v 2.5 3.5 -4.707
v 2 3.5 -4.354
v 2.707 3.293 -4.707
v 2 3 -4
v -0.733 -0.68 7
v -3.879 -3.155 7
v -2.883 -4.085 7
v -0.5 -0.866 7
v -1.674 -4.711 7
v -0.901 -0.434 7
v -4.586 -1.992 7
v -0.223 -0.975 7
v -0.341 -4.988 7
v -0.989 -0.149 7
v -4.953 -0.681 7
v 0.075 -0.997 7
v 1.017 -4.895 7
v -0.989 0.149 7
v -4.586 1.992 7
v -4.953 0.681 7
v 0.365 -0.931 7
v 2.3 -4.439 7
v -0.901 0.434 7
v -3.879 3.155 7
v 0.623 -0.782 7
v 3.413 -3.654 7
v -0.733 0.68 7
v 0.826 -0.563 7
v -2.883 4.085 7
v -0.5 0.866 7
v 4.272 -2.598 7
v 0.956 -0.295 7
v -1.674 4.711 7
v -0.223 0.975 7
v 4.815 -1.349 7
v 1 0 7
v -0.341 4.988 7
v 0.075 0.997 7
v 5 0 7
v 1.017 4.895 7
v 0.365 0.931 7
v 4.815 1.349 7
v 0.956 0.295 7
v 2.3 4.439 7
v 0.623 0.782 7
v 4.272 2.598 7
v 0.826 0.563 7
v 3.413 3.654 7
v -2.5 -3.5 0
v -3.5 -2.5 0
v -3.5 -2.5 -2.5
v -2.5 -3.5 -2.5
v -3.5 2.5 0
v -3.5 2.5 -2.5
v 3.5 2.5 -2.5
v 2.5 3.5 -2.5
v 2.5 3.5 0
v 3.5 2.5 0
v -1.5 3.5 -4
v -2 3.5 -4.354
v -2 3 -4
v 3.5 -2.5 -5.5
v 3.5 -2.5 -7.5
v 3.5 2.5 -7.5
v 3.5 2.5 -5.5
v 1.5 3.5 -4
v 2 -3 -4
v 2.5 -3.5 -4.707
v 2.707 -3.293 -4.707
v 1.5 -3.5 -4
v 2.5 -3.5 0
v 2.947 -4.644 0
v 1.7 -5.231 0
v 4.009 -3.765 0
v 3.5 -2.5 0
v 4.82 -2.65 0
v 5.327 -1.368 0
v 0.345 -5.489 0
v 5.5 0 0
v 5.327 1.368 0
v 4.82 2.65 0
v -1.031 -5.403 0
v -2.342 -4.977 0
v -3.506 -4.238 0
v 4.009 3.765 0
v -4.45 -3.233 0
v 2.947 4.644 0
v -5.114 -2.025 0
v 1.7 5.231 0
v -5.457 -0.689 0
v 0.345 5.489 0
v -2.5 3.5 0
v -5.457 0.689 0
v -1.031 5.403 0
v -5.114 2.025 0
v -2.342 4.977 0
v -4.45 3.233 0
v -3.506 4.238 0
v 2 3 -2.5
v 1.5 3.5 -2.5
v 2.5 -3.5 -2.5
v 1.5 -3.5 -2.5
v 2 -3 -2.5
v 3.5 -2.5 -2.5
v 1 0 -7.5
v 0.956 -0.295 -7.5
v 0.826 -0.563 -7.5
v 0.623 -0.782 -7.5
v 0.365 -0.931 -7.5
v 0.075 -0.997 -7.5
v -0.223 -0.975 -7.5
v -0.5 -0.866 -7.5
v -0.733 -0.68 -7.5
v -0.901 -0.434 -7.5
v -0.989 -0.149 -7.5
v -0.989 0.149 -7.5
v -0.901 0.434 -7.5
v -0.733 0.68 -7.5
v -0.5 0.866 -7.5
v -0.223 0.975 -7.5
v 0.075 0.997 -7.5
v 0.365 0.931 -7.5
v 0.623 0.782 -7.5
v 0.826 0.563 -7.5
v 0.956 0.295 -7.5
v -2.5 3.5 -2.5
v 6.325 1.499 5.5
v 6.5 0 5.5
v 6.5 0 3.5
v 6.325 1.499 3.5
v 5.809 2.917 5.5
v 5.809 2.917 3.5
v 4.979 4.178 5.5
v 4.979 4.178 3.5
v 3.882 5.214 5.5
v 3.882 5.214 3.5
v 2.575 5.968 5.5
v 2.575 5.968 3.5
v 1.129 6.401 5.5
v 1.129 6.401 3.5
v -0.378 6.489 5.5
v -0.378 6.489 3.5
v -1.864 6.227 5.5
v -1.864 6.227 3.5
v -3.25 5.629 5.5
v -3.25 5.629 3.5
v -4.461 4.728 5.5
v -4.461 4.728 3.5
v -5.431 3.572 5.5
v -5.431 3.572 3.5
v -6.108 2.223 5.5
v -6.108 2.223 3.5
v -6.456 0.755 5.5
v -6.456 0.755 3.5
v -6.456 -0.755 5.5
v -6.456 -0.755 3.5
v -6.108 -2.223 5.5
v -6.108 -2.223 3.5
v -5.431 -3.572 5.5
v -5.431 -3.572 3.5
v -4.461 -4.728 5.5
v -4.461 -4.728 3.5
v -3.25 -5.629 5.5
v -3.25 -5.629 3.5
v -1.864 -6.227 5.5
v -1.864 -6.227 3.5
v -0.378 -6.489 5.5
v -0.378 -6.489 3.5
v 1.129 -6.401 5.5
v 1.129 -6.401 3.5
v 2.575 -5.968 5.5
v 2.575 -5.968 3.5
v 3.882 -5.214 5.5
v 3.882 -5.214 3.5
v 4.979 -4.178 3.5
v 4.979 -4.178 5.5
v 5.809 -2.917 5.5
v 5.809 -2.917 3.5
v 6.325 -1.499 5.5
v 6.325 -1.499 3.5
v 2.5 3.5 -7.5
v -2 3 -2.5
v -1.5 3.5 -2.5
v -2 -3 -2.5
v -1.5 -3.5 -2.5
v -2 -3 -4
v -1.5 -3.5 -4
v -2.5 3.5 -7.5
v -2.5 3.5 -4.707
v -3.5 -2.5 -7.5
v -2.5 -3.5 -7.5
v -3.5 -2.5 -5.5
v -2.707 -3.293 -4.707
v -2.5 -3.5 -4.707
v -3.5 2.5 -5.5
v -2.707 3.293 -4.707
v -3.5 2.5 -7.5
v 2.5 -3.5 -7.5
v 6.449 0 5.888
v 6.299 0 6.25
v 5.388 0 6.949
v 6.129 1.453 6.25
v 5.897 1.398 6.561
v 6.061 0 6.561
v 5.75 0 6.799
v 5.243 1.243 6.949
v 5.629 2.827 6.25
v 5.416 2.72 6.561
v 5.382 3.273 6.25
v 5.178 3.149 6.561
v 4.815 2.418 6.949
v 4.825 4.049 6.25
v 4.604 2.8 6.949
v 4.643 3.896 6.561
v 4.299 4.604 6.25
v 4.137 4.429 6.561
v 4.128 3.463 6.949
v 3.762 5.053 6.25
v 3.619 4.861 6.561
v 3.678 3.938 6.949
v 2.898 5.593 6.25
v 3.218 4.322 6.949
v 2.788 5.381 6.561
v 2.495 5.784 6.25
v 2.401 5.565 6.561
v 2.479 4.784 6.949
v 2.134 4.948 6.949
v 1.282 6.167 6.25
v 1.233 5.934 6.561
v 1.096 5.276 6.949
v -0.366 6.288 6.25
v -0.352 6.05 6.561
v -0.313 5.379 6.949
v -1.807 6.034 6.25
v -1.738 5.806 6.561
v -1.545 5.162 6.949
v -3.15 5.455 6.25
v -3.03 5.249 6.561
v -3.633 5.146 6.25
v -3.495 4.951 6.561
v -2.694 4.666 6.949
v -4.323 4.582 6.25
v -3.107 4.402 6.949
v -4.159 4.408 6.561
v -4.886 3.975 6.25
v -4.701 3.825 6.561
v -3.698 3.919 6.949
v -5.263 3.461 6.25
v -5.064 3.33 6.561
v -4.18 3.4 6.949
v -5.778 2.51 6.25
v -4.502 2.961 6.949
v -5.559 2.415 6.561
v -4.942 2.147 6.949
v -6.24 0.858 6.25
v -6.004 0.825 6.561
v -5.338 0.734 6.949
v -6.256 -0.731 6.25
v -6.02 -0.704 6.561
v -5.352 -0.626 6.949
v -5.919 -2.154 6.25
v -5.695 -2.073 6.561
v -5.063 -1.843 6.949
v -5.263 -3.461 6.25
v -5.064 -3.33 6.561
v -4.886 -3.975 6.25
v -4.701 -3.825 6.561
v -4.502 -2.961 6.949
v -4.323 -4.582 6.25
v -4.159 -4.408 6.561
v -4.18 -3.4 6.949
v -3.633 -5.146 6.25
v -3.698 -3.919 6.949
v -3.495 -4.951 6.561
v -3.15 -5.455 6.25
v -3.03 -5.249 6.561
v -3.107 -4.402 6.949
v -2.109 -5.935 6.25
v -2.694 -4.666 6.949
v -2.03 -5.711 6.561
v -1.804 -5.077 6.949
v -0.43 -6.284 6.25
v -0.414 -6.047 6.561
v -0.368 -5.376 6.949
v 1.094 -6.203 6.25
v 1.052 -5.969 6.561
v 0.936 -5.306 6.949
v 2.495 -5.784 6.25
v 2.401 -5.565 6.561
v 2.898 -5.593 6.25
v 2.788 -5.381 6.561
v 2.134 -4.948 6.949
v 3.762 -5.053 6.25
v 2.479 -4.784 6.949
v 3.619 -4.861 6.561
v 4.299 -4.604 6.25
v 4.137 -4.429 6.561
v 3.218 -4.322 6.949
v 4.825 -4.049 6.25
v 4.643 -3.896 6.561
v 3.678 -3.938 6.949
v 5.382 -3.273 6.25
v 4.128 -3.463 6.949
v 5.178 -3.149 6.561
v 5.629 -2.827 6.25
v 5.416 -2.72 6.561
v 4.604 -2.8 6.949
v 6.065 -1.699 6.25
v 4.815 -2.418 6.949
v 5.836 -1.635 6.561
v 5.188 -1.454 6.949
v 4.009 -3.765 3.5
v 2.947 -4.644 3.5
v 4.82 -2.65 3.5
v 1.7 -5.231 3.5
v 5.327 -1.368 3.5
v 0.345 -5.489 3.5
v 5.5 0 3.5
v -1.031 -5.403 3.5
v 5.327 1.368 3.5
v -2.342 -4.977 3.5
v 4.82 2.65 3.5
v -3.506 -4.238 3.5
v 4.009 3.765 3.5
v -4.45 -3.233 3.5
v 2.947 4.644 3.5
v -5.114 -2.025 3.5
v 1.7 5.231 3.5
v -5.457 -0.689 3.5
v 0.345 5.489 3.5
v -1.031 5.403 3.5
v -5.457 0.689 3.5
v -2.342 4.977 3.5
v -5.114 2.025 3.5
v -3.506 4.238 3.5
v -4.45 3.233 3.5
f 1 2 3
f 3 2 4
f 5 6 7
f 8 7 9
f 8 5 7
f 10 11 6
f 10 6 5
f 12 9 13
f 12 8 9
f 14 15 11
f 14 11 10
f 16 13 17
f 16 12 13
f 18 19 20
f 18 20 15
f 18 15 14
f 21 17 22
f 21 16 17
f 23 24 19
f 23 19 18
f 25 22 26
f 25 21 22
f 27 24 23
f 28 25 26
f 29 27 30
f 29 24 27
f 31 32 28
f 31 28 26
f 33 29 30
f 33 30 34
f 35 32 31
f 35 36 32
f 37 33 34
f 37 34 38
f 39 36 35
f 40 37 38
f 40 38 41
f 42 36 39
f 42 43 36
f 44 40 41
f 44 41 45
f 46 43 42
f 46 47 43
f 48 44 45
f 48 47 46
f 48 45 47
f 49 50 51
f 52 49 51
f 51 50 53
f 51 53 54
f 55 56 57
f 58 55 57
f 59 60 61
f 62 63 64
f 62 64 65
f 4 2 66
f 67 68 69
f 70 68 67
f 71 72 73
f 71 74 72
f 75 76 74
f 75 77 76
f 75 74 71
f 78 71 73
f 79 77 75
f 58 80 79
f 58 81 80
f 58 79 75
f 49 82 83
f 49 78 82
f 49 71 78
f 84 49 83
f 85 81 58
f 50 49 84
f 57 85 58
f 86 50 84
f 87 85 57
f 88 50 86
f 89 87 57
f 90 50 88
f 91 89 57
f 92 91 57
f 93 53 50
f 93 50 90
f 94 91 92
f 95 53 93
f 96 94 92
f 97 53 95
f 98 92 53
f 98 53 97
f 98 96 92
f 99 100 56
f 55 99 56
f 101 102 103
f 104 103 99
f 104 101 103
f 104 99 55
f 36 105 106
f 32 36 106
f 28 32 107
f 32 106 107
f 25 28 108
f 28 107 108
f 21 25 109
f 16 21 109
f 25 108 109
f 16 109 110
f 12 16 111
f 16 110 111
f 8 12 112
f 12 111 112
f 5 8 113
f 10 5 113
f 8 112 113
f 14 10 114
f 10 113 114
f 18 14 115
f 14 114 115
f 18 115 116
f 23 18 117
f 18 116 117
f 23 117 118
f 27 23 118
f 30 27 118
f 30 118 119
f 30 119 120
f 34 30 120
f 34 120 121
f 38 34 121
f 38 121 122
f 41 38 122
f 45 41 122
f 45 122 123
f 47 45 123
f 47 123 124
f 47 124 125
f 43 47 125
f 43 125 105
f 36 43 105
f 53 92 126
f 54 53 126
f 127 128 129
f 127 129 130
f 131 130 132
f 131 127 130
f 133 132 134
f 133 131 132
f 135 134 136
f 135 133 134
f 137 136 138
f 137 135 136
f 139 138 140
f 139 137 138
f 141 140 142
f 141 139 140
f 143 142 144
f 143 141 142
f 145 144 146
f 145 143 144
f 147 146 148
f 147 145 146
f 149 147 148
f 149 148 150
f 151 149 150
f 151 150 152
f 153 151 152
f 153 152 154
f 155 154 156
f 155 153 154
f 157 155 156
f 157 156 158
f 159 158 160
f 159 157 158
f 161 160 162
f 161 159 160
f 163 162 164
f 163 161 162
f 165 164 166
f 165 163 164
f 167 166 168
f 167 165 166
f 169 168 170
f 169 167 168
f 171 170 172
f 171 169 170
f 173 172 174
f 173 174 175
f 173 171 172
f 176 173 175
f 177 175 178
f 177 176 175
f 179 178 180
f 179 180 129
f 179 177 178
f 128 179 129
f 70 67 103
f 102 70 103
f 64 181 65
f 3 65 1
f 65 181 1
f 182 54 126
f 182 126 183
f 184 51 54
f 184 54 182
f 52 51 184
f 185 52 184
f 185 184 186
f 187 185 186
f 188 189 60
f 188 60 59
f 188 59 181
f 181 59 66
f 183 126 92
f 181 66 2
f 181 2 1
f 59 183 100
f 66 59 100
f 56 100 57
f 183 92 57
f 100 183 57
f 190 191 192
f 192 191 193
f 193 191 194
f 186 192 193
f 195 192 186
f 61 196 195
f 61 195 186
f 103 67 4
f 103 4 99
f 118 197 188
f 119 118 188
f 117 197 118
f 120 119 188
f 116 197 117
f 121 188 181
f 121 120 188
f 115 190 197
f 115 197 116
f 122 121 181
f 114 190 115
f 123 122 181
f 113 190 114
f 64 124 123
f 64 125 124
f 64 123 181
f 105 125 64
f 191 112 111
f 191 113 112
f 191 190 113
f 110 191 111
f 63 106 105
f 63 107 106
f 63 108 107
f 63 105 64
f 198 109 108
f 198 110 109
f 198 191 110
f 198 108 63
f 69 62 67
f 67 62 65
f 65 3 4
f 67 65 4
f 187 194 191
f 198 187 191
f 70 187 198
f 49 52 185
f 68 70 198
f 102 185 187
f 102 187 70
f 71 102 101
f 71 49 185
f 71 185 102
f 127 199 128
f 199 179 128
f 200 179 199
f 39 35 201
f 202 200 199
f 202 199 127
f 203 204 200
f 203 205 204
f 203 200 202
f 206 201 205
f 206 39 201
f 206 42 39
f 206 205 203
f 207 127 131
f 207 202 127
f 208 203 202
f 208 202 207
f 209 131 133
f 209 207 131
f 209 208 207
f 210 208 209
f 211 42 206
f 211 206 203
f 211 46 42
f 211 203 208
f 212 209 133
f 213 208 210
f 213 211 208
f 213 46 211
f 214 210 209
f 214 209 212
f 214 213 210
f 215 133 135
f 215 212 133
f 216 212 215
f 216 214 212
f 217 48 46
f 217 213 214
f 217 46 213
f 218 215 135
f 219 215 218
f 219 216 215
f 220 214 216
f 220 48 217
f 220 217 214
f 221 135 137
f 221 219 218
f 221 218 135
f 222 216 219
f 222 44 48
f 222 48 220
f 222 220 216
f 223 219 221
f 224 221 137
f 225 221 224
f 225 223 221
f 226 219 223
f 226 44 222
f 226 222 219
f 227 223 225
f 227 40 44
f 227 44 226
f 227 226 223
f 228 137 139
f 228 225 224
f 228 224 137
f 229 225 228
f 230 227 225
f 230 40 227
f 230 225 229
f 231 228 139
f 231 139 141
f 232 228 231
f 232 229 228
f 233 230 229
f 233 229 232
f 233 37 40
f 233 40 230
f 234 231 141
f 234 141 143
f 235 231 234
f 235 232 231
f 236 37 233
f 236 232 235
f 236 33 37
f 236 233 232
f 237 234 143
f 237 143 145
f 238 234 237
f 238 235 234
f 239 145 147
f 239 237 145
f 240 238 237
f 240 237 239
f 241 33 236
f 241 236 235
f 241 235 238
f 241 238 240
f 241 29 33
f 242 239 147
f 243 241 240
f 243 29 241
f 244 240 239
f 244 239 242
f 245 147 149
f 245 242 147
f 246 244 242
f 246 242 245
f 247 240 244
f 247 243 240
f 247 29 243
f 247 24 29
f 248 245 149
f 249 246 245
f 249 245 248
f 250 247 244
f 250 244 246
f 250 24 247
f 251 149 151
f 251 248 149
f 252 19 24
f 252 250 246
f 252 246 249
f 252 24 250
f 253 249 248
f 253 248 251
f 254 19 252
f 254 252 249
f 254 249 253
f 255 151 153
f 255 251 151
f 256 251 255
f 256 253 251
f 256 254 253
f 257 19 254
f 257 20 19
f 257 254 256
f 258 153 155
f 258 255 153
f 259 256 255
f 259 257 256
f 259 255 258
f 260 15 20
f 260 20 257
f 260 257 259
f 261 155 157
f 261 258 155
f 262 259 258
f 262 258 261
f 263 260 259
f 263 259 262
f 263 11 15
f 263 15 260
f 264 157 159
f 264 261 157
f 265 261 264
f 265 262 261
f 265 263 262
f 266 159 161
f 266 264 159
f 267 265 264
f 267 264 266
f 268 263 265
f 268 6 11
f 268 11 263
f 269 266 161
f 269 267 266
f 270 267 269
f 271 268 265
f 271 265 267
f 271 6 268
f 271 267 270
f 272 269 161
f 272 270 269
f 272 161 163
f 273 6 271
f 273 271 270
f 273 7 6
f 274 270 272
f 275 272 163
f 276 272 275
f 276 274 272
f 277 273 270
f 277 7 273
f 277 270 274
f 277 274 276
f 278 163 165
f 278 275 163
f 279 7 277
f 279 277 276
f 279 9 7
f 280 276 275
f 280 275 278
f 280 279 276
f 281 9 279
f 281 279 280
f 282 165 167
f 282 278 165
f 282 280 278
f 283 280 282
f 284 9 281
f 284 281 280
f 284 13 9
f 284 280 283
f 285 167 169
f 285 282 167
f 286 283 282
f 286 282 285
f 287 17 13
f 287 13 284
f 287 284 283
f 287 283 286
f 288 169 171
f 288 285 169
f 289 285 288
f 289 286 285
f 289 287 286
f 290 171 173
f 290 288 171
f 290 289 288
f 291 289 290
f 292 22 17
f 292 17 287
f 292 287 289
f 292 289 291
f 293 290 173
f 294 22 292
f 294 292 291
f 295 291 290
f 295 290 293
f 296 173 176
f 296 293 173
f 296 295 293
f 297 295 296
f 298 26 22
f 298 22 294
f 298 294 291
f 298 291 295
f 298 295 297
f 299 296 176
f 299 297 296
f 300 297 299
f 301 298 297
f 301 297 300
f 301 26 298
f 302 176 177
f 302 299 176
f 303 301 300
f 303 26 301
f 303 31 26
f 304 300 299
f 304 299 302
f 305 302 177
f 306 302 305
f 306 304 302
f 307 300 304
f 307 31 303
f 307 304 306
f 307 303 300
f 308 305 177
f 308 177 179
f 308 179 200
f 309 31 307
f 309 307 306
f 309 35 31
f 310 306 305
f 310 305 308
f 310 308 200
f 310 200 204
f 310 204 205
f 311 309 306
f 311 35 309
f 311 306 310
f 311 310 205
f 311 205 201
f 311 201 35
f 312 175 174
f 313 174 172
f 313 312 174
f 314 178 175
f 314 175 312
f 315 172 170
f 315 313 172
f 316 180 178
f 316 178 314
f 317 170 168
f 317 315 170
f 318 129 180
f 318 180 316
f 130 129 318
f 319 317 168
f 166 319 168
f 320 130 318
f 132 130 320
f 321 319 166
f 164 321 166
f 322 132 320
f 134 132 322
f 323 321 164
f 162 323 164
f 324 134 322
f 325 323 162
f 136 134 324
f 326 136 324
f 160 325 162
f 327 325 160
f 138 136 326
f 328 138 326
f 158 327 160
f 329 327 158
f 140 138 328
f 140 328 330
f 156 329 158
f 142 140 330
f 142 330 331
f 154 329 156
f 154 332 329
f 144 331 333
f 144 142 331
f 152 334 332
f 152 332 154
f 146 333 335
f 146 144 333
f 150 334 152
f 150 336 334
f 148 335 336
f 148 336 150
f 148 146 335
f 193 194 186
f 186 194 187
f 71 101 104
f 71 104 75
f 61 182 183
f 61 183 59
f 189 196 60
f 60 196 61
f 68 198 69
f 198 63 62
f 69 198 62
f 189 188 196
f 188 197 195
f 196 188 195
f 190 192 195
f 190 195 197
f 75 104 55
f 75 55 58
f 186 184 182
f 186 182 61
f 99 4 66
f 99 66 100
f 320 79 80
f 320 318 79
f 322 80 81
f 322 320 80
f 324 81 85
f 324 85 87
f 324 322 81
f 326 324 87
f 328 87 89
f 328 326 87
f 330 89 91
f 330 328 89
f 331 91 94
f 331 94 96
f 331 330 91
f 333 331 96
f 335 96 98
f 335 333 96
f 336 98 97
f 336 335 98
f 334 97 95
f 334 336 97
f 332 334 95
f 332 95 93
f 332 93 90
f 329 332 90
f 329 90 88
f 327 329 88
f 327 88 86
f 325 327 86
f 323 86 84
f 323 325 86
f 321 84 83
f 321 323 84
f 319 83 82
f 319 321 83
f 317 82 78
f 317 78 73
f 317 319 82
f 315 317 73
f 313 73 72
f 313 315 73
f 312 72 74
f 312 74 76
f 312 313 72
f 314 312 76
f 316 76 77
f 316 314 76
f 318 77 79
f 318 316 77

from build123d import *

# Parameters (mm, degrees)
F3_DEPTH     = 3.5
F4_SIZE      = 1
F5_SIZE      = 0.5
F6_T4_DEPTH  = 8.4221557451
F6_T11_DEPTH = 13.7150489639
F6_T21_DEPTH = 8.4221557451
F6_T28_DEPTH = 8.4221557451
F6_T35_DEPTH = 13.7150489639
F6_T45_DEPTH = 8.4221557451
F7_R         = 1.5
F8_R         = 1
F9_DEPTH     = 25


# Not quite as in the source:
# - a fillet or chamfer that OpenCascade refuses, or shapes differently, is made with other operations: its cross-section is extruded or revolved along the edge and cut away or added


with BuildPart() as f1:
    # F0 (on Front) → F1 (revolve)
    with BuildSketch(Plane.XZ):
        Polygon((0, 7), (0, 0), (5.5, 0), (5.5, 3.5), (6.5, 3.5), (6.5, 7), align=None)
    revolve(axis=Axis((0, 0, 5.0261294236), (0, 0, 1)))

    # F2 (on Front) → F3 (join, symmetric)
    with BuildSketch(Plane.XZ):
        Polygon((3.5, 0), (-3.5, 0), (-3.5, -2.5), (-2, -2.5), (-2, -5.5), (-3.5, -5.5), (-3.5, -7.5), (3.5, -7.5), (3.5, -5.5), (2, -5.5), (2, -2.5), (3.5, -2.5), align=None)
    extrude(amount=F3_DEPTH, both=True)

    # F4
    f4_edges = [f1.edges().sort_by_distance(p)[0] for p in [
        (3.5, -3.5, -1.25),
        (3.5, 3.5, -1.25),
        (-3.5, 3.5, -1.25),
        (-3.5, -3.5, -1.25),
        (-3.5, -3.5, -6.5),
        (3.5, -3.5, -6.5),
        (-3.5, 3.5, -6.5),
        (3.5, 3.5, -6.5),
    ]]
    chamfer(f4_edges, length=F4_SIZE)

    # F5
    f5_edges = [f1.edges().sort_by_distance(p)[0] for p in [
        (2, -3.5, -4),
        (-2, -3.5, -4),
        (-2, 3.5, -4),
        (2, 3.5, -4),
    ]]
    chamfer(f5_edges, length=F5_SIZE)

    # F6: chamfer of 1.5 on 6 edges, made by hand


with BuildPart() as f6_tool2:
    # F6_s3 → F6_t4 (new body)
    with BuildSketch(Plane(origin=(3.7276817198, -3.7276817198, 0), x_dir=(0, 0, 1), z_dir=(-0.7071067812, 0.7071067812, 0))):
        Polygon((-5.5, -5.0355339059), (-4, -3.5355339059), (-5.5, -3.5355339059), align=None)
    extrude(amount=F6_T4_DEPTH)

    split(bisect_by=Plane.XZ.offset(3.5), keep=Keep.BOTTOM)

    split(bisect_by=Plane(origin=(-3, -3, 0), x_dir=(0, 0, 1), z_dir=(0.7071067812, 0.7071067812, 0)), keep=Keep.TOP)

    split(bisect_by=Plane(origin=(1, 0, -1), x_dir=(0, 1, 0), z_dir=(0.7071067812, 0, -0.7071067812)), keep=Keep.TOP)


with BuildPart() as f1_1:
    add(f1.part)

    # F6_t1: union F6_tool2
    add(f6_tool2.part)


with BuildPart() as f6_tool9:
    # F6_s10 → F6_t11 (new body)
    with BuildSketch(Plane.XZ.offset(-6.8575244819)):
        Polygon((-3.5, -5.5), (-2, -4), (-2, -5.5), align=None)
    extrude(amount=F6_T11_DEPTH)

    split(bisect_by=Plane.XZ.offset(3.5), keep=Keep.BOTTOM)

    split(bisect_by=Plane(origin=(-3, -3, 0), x_dir=(0, 0, 1), z_dir=(0.7071067812, 0.7071067812, 0)), keep=Keep.TOP)

    split(bisect_by=Plane.XZ.offset(-3.5), keep=Keep.TOP)

    split(bisect_by=Plane(origin=(-3, 3, 0), x_dir=(0, 0, 1), z_dir=(0.7071067812, -0.7071067812, 0)), keep=Keep.TOP)

    split(bisect_by=Plane(origin=(0.1642135624, -0.1642135624, -0.232233047), x_dir=(0.7071067812, 0.7071067812, 0), z_dir=(0.5, -0.5, -0.7071067812)), keep=Keep.TOP)

    split(bisect_by=Plane(origin=(0.1642135624, 0.1642135624, -0.232233047), x_dir=(-0.7071067812, 0.7071067812, 0), z_dir=(0.5, 0.5, -0.7071067812)), keep=Keep.TOP)


with BuildPart() as f1_2:
    add(f1_1.part)

    # F6_t8: union F6_tool9
    add(f6_tool9.part)


with BuildPart() as f6_tool19:
    # F6_s20 → F6_t21 (new body)
    with BuildSketch(Plane(origin=(3.7276817198, 3.7276817198, 0), x_dir=(0, 0, 1), z_dir=(-0.7071067812, -0.7071067812, 0))):
        Polygon((-5.5, 5.0355339059), (-4, 3.5355339059), (-5.5, 3.5355339059), align=None)
    extrude(amount=F6_T21_DEPTH)

    split(bisect_by=Plane.XZ.offset(-3.5), keep=Keep.TOP)

    split(bisect_by=Plane(origin=(-3, 3, 0), x_dir=(0, 0, 1), z_dir=(0.7071067812, -0.7071067812, 0)), keep=Keep.TOP)

    split(bisect_by=Plane(origin=(1, 0, -1), x_dir=(0, 1, 0), z_dir=(0.7071067812, 0, -0.7071067812)), keep=Keep.TOP)


with BuildPart() as f1_3:
    add(f1_2.part)

    # F6_t18: union F6_tool19
    add(f6_tool19.part)


with BuildPart() as f6_tool26:
    # F6_s27 → F6_t28 (new body)
    with BuildSketch(Plane(origin=(-3.7276817198, -3.7276817198, 0), x_dir=(0, 0, 1), z_dir=(0.7071067812, 0.7071067812, 0))):
        Polygon((-5.5, 5.0355339059), (-4, 3.5355339059), (-5.5, 3.5355339059), align=None)
    extrude(amount=F6_T28_DEPTH)

    split(bisect_by=Plane.XZ.offset(3.5), keep=Keep.BOTTOM)

    split(bisect_by=Plane(origin=(3, -3, 0), x_dir=(0, 0, 1), z_dir=(-0.7071067812, 0.7071067812, 0)), keep=Keep.TOP)

    split(bisect_by=Plane(origin=(-1, 0, -1), x_dir=(0, 1, 0), z_dir=(-0.7071067812, 0, -0.7071067812)), keep=Keep.TOP)


with BuildPart() as f1_4:
    add(f1_3.part)

    # F6_t25: union F6_tool26
    add(f6_tool26.part)


with BuildPart() as f6_tool33:
    # F6_s34 → F6_t35 (new body)
    with BuildSketch(Plane.XZ.offset(-6.8575244819)):
        Polygon((3.5, -5.5), (2, -4), (2, -5.5), align=None)
    extrude(amount=F6_T35_DEPTH)

    split(bisect_by=Plane.XZ.offset(3.5), keep=Keep.BOTTOM)

    split(bisect_by=Plane(origin=(3, -3, 0), x_dir=(0, 0, 1), z_dir=(-0.7071067812, 0.7071067812, 0)), keep=Keep.TOP)

    split(bisect_by=Plane.XZ.offset(-3.5), keep=Keep.TOP)

    split(bisect_by=Plane(origin=(3, 3, 0), x_dir=(0, 0, 1), z_dir=(-0.7071067812, -0.7071067812, 0)), keep=Keep.TOP)

    split(bisect_by=Plane(origin=(-0.1642135624, -0.1642135624, -0.232233047), x_dir=(0.7071067812, -0.7071067812, 0), z_dir=(-0.5, -0.5, -0.7071067812)), keep=Keep.TOP)

    split(bisect_by=Plane(origin=(-0.1642135624, 0.1642135624, -0.232233047), x_dir=(-0.7071067812, -0.7071067812, 0), z_dir=(-0.5, 0.5, -0.7071067812)), keep=Keep.TOP)


with BuildPart() as f1_5:
    add(f1_4.part)

    # F6_t32: union F6_tool33
    add(f6_tool33.part)


with BuildPart() as f6_tool43:
    # F6_s44 → F6_t45 (new body)
    with BuildSketch(Plane(origin=(-3.7276817198, 3.7276817198, 0), x_dir=(0, 0, 1), z_dir=(0.7071067812, -0.7071067812, 0))):
        Polygon((-5.5, -5.0355339059), (-4, -3.5355339059), (-5.5, -3.5355339059), align=None)
    extrude(amount=F6_T45_DEPTH)

    split(bisect_by=Plane.XZ.offset(-3.5), keep=Keep.TOP)

    split(bisect_by=Plane(origin=(3, 3, 0), x_dir=(0, 0, 1), z_dir=(-0.7071067812, -0.7071067812, 0)), keep=Keep.TOP)

    split(bisect_by=Plane(origin=(-1, 0, -1), x_dir=(0, 1, 0), z_dir=(-0.7071067812, 0, -0.7071067812)), keep=Keep.TOP)


with BuildPart() as f1_6:
    add(f1_5.part)

    # F6_t42: union F6_tool43
    add(f6_tool43.part)

    # F7
    f7_edges = [f1_6.edges().sort_by_distance(p)[0] for p in [
        (-6.5, 0, 7),
    ]]
    fillet(f7_edges, radius=F7_R)

    # F8 (on face) → F9 (cut)
    with BuildSketch(Plane(origin=(0, 0, -7.5), x_dir=(1, 0, 0), z_dir=(0, 0, -1))):
        Circle(F8_R)
    extrude(amount=-F9_DEPTH, mode=Mode.SUBTRACT)


solid = f1_6.part
